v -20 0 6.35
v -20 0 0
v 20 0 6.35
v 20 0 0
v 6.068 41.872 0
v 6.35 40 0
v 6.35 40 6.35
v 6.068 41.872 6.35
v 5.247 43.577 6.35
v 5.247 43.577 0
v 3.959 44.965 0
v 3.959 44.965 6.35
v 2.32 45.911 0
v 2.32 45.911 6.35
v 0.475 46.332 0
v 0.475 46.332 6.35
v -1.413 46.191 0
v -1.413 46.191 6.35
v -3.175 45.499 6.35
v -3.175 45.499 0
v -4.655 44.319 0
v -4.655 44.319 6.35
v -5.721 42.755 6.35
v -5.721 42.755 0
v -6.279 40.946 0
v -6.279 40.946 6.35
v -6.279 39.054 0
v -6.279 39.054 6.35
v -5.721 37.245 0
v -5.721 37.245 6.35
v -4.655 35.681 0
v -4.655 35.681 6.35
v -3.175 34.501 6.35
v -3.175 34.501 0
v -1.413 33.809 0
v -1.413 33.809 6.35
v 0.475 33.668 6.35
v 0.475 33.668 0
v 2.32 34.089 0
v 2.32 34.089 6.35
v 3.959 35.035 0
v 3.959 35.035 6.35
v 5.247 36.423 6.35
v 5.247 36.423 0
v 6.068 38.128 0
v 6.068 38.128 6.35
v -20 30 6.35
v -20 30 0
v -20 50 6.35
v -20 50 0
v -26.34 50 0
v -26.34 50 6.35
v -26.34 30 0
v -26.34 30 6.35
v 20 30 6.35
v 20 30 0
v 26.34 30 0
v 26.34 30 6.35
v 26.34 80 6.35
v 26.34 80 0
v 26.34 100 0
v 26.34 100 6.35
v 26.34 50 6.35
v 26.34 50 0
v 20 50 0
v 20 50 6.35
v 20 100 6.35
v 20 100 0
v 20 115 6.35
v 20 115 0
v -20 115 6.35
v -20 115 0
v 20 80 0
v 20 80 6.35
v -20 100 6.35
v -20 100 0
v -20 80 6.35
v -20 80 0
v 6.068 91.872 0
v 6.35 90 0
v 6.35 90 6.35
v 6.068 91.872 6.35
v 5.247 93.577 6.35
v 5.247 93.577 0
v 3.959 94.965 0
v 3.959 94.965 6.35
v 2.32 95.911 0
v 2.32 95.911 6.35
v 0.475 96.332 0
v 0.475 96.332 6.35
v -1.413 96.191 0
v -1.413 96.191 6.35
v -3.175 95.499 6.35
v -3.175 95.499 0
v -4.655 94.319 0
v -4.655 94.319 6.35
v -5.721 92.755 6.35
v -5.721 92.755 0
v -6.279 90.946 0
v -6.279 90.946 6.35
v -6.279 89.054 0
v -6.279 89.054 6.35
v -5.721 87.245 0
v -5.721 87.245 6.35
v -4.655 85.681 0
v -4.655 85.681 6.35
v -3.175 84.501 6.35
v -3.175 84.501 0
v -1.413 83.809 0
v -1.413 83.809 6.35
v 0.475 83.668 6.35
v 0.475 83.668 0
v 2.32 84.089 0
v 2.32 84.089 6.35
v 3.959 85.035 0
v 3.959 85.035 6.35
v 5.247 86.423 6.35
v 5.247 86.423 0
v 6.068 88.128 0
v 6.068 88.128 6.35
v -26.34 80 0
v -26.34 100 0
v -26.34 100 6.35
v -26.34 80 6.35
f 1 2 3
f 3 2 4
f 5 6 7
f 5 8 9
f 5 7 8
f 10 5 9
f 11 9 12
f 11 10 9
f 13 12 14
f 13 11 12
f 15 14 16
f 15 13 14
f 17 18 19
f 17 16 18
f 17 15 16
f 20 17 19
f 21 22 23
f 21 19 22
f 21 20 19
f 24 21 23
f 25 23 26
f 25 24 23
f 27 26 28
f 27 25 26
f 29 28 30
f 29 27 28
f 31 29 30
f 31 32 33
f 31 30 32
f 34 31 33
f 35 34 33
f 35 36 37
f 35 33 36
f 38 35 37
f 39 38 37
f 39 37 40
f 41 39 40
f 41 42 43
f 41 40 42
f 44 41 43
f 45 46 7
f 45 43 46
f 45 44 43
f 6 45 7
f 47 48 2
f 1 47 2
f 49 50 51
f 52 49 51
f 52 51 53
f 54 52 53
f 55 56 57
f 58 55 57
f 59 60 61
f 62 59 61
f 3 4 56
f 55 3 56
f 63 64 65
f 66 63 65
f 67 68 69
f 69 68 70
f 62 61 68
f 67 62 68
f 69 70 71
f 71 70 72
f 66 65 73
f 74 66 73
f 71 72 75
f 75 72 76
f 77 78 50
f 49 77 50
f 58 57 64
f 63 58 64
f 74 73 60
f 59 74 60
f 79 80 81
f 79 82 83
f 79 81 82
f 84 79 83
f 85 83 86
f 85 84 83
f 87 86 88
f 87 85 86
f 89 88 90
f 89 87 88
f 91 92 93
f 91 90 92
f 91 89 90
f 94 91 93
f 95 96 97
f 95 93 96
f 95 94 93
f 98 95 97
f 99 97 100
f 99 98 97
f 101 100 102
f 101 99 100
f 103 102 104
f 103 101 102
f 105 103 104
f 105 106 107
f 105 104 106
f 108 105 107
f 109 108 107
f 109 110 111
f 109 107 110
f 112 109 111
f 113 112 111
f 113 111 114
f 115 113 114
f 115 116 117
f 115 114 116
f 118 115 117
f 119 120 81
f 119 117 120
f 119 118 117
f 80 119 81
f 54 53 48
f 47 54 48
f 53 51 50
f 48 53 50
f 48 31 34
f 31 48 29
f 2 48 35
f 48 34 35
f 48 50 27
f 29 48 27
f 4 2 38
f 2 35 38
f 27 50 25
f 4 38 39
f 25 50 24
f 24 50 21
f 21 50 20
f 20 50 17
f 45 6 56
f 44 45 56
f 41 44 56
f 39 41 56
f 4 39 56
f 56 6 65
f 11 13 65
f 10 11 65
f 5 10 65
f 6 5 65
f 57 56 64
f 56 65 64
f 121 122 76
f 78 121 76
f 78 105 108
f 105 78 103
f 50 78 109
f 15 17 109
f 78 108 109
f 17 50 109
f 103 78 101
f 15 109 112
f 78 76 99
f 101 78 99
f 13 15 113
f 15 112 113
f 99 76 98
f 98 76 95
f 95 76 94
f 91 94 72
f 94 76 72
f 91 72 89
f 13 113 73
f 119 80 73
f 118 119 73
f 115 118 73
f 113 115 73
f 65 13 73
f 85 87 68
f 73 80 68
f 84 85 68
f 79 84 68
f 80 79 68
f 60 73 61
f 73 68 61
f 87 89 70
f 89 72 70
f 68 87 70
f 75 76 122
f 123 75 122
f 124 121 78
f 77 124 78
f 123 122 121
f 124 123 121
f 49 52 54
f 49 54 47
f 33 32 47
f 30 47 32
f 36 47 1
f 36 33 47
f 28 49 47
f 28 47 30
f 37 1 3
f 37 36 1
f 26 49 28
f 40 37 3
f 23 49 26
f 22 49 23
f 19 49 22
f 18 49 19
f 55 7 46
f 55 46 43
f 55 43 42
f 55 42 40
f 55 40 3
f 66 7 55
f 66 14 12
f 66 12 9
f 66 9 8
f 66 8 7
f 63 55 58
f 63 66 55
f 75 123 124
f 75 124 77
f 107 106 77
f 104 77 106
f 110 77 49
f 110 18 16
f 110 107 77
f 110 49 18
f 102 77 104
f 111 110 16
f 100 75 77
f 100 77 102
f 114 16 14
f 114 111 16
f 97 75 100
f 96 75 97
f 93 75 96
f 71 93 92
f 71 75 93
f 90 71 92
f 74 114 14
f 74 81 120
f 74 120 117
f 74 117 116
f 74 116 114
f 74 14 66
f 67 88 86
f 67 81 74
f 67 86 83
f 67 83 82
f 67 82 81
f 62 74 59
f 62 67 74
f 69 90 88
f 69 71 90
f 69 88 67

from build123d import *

# Parameters (mm, degrees)
BOSS_EXTRUDE1_DEPTH     = 6.35
CUT_EXTRUDE1_DEPTH      = 119.1487118
CUT_EXTRUDE1_DEPTH_BACK = 119.1487118
SKETCH3_R               = 6.35


with BuildPart() as part:
    # Sketch1 → Boss-Extrude1 (new body)
    with BuildSketch(Plane.XY):
        Polygon((-20, 0), (20, 0), (20, 30), (26.34, 30), (26.34, 50), (20, 50), (20, 80), (26.34, 80), (26.34, 100), (20, 100), (20, 115), (-20, 115), (-20, 100), (-26.34, 100), (-26.34, 80), (-20, 80), (-20, 50), (-26.34, 50), (-26.34, 30), (-20, 30), align=None)
    extrude(amount=BOSS_EXTRUDE1_DEPTH)

    # Sketch3 → Cut-Extrude1 (cut, two sides: drawn at the far end of the back side and taken through both)
    with BuildSketch(Plane.XY.offset(6.35).offset(-CUT_EXTRUDE1_DEPTH_BACK)):
        with Locations((0, 90)):
            Circle(SKETCH3_R)
        with Locations((0, 40)):
            Circle(SKETCH3_R)
    extrude(amount=CUT_EXTRUDE1_DEPTH + CUT_EXTRUDE1_DEPTH_BACK, mode=Mode.SUBTRACT)


solid = part.part
